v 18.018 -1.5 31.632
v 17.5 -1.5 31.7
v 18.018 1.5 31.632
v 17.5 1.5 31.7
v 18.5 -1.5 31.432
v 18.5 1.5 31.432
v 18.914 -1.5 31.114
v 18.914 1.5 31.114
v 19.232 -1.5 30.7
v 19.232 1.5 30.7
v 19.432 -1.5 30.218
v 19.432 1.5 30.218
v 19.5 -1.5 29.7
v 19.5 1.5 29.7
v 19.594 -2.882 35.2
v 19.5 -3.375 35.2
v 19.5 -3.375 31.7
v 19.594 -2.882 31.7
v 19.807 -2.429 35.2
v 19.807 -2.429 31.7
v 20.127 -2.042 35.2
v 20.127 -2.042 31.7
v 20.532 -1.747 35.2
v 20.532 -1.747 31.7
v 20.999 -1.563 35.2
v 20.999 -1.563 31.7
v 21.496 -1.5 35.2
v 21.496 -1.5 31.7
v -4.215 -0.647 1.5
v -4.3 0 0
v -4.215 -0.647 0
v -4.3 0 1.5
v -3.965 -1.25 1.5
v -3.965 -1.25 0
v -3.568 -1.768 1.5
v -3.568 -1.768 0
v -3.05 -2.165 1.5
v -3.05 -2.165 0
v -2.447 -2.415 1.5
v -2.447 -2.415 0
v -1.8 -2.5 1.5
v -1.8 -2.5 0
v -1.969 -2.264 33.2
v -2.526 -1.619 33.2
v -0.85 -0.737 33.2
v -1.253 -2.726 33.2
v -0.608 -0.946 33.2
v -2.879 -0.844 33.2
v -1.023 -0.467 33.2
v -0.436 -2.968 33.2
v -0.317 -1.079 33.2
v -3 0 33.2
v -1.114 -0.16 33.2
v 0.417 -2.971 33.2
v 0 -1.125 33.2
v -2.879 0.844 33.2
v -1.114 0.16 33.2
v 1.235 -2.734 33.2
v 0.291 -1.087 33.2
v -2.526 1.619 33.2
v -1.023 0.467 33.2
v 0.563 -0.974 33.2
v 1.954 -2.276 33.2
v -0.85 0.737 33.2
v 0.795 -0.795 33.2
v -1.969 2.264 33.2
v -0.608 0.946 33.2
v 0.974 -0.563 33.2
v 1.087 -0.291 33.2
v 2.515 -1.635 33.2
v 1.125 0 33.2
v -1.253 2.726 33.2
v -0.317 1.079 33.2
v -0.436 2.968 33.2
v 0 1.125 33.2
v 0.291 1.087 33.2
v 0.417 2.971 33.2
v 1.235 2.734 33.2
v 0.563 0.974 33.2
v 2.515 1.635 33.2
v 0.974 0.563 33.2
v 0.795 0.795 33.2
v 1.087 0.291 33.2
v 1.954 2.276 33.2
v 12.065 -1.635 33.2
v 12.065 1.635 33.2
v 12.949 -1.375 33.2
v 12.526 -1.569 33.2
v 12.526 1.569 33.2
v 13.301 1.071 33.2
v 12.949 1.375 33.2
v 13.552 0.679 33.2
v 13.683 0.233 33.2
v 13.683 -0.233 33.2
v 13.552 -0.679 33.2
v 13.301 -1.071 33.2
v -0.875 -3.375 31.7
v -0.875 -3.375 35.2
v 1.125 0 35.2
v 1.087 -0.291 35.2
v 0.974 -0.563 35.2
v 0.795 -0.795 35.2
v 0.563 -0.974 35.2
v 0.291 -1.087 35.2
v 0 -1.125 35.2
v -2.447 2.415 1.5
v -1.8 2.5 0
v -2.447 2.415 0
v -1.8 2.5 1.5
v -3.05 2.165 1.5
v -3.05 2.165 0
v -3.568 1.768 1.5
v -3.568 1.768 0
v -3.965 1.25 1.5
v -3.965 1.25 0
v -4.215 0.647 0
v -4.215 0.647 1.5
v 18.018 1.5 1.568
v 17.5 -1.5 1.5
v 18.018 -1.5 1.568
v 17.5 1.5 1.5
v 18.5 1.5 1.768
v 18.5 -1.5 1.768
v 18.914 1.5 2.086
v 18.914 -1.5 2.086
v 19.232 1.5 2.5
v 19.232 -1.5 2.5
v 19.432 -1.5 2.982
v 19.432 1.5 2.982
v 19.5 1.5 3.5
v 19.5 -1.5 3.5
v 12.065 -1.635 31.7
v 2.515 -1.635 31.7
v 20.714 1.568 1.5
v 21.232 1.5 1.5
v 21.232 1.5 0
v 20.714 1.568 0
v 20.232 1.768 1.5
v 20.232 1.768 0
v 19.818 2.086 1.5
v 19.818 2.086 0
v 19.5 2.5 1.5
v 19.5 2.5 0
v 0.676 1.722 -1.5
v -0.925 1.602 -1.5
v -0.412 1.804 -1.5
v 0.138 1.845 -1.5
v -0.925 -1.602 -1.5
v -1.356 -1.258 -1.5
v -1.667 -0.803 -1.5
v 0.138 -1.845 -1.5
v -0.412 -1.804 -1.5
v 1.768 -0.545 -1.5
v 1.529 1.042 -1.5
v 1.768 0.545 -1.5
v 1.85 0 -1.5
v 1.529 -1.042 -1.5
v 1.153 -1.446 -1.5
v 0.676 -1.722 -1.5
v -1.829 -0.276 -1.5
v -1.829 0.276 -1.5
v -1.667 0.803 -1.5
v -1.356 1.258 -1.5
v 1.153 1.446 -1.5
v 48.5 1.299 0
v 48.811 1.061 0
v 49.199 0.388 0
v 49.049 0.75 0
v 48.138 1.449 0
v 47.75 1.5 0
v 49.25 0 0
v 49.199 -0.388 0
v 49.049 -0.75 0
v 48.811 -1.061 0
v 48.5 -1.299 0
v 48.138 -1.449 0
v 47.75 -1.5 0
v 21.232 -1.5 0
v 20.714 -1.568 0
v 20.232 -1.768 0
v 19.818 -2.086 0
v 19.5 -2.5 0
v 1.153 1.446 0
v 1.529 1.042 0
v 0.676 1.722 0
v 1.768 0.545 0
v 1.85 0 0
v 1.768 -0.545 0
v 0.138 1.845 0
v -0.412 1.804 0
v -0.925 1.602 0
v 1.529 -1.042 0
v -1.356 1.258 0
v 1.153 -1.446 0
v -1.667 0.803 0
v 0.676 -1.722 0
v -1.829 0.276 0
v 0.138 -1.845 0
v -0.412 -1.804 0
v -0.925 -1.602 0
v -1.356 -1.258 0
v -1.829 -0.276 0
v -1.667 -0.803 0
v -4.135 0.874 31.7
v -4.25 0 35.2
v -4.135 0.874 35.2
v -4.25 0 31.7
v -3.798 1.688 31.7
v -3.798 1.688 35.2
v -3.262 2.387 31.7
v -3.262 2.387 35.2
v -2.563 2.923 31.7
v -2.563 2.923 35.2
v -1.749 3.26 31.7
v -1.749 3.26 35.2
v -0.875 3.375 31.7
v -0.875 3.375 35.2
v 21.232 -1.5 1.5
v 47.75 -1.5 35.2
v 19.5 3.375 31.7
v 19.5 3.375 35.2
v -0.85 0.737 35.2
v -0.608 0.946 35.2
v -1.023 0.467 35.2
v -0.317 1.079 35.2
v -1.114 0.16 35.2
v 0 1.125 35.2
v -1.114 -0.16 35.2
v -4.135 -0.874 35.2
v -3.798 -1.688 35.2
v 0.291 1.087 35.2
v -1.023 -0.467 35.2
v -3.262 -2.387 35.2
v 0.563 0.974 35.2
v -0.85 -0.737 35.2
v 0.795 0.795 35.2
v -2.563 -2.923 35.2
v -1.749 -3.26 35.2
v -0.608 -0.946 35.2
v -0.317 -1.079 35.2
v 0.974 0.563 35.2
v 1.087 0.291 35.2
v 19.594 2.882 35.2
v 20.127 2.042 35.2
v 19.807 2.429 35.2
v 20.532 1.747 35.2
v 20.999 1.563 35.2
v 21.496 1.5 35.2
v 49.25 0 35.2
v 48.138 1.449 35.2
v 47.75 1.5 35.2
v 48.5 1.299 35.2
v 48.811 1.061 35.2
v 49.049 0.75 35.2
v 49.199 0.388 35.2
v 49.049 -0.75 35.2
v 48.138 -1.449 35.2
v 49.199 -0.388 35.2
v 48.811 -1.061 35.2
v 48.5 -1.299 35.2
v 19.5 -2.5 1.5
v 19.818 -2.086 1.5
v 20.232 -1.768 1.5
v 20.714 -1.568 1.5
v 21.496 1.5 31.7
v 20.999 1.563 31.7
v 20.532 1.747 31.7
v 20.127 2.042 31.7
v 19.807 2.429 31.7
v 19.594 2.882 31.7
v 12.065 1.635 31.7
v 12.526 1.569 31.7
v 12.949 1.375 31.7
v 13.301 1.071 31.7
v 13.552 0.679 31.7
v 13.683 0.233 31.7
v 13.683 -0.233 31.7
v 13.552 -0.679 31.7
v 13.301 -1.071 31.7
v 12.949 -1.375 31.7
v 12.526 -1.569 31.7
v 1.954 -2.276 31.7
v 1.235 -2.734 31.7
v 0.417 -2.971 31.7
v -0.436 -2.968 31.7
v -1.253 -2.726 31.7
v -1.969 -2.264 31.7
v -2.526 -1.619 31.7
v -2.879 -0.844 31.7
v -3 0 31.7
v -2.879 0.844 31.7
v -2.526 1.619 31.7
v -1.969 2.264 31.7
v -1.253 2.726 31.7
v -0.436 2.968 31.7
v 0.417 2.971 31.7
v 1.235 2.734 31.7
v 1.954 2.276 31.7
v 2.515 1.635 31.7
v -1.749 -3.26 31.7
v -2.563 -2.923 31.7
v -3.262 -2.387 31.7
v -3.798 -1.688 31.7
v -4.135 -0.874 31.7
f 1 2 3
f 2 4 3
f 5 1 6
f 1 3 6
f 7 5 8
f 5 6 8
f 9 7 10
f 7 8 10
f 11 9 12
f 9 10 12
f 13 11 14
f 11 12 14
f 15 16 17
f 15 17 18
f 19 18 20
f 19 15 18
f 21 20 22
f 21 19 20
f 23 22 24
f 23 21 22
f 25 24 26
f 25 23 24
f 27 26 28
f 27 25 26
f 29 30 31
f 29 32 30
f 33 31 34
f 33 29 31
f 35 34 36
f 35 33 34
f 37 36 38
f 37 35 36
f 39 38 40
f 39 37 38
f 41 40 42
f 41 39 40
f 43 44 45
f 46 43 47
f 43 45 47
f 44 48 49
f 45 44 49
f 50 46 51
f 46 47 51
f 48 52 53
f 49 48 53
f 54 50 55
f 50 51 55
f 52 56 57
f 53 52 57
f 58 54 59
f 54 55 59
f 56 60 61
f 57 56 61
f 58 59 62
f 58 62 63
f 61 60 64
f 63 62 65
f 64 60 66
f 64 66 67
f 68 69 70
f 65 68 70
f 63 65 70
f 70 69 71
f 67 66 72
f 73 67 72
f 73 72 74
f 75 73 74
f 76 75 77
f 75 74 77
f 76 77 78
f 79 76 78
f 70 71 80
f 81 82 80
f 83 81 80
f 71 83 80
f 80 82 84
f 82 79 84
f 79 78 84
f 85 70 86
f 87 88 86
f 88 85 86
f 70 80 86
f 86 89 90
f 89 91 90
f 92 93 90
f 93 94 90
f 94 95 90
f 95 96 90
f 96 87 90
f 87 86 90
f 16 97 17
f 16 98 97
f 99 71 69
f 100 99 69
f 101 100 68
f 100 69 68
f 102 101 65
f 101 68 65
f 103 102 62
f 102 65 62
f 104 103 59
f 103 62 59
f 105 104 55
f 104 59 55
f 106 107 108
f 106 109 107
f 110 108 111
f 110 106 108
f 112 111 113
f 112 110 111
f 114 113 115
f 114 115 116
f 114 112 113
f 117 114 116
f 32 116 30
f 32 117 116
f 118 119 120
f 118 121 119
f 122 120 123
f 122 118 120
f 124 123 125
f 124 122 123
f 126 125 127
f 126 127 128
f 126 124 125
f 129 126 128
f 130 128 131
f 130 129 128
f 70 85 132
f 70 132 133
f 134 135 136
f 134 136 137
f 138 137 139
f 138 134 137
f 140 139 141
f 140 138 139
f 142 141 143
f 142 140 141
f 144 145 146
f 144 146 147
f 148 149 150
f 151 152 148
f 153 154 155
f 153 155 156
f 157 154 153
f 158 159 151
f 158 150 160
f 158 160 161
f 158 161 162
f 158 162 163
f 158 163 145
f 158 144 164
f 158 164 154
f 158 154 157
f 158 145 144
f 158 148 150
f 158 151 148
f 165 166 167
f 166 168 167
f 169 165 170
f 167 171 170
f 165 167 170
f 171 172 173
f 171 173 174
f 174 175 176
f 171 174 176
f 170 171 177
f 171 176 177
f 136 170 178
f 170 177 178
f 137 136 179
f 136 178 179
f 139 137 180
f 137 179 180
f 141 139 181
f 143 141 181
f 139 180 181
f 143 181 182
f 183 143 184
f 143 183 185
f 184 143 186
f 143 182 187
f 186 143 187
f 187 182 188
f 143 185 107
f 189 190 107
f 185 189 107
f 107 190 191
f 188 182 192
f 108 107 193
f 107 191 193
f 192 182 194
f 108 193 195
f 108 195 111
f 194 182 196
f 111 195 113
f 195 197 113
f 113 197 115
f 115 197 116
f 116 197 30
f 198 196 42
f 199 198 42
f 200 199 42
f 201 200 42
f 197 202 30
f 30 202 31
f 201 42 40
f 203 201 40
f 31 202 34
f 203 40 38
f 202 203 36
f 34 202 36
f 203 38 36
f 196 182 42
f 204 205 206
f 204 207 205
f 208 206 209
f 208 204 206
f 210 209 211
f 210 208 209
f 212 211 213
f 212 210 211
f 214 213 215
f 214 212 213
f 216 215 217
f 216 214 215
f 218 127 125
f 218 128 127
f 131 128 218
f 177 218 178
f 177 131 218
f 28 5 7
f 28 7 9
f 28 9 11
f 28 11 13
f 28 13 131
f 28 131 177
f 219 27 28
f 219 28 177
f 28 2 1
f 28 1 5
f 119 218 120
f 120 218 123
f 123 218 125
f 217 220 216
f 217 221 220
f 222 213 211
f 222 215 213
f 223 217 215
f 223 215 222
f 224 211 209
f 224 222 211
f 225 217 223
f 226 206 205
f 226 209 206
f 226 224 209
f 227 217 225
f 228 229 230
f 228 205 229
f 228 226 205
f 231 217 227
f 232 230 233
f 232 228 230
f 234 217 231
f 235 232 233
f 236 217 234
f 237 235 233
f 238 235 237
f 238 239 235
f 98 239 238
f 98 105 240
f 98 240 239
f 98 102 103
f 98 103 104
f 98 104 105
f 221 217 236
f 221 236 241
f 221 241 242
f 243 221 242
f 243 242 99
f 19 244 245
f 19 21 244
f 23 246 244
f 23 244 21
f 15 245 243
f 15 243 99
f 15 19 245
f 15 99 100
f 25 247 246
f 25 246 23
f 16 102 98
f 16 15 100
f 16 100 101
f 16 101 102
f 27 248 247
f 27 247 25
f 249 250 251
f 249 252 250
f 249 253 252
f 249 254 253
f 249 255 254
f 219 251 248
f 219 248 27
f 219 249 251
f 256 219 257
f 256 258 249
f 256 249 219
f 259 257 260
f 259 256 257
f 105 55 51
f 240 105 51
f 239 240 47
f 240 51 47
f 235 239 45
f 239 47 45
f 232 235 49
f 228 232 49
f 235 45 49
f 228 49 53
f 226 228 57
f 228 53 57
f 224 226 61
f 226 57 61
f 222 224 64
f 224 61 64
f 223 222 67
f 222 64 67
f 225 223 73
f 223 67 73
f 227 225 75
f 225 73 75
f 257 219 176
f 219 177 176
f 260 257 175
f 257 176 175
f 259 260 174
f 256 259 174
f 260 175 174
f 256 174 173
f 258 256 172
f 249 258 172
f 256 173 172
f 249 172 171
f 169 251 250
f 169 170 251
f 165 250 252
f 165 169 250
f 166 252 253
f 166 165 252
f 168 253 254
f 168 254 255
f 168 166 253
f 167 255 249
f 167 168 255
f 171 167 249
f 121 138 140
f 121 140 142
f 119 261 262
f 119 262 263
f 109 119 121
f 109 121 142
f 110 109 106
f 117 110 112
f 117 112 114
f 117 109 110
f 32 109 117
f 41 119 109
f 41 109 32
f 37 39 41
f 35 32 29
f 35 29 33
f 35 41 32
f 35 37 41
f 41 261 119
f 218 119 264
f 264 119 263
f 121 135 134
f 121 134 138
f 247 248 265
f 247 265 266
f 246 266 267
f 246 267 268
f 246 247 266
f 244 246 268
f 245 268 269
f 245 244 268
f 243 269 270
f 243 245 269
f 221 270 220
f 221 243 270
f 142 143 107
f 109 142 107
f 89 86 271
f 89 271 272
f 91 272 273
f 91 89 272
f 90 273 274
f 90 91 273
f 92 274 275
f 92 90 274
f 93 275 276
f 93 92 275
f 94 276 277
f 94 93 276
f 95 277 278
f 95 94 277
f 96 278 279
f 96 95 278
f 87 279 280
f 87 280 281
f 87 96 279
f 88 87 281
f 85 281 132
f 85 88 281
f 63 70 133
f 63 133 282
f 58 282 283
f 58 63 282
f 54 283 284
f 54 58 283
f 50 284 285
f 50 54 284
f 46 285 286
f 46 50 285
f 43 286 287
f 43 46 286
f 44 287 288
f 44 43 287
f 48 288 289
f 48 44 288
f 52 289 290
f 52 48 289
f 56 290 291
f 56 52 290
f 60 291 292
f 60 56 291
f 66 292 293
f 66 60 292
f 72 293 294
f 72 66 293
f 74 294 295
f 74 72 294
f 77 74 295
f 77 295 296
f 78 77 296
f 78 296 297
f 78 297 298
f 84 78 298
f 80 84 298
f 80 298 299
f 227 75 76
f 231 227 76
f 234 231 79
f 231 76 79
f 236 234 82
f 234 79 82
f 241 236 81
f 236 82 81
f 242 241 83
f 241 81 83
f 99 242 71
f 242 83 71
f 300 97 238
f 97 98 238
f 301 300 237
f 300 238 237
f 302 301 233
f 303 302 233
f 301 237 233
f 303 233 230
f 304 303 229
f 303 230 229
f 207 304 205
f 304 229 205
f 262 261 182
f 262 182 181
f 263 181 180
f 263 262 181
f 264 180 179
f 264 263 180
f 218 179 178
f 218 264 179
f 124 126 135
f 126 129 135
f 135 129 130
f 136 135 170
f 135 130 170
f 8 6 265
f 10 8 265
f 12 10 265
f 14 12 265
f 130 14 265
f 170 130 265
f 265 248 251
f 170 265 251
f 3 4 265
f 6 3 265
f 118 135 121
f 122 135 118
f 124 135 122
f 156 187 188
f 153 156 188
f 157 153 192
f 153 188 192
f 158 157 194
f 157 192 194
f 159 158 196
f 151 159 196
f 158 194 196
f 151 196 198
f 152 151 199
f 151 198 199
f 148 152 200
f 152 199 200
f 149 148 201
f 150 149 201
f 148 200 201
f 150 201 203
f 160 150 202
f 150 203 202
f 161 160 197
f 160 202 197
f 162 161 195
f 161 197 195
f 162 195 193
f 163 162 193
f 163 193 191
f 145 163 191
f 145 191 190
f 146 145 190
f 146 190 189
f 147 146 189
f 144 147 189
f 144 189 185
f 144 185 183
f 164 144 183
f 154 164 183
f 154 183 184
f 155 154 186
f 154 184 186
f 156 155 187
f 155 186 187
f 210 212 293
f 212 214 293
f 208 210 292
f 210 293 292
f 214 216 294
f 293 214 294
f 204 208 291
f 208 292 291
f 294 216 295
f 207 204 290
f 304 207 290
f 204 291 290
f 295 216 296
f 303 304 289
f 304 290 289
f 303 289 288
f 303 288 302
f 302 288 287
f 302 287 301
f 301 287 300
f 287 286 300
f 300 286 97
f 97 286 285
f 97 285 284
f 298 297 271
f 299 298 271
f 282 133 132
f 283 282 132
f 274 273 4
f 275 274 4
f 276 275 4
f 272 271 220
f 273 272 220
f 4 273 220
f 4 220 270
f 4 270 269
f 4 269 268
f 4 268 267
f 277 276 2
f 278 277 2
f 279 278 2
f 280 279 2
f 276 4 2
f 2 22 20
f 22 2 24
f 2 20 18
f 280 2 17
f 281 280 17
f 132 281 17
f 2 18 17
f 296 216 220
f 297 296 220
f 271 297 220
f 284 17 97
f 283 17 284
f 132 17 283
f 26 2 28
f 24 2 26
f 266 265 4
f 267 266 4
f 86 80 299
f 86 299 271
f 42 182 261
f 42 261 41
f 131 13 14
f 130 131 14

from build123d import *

# Parameters (mm, degrees)
BOSS_EXTRUDE10_DEPTH = 2
BOSS_EXTRUDE15_DEPTH = 1.5
BOSS_EXTRUDE17_START = 2
SKETCH1_17_W         = 29.75
SKETCH1_17_H         = 3
BOSS_EXTRUDE17_DEPTH = 35.2
SKETCH2_W            = 23.8
SKETCH2_H            = 5
BOSS_EXTRUDE18_DEPTH = 1.5
FILLET1_R            = 2
FILLET3_R            = 2
FILLET2_R            = 3.375
FILLET5_R            = 2.5
SKETCH4_R            = 1.85
BOSS_EXTRUDE19_DEPTH = 1.5
FILLET4_R            = 1.5


# Some blends are built 0.0001 mm under size
with BuildPart() as part:
    # Sketch1 → Boss-Extrude10 (new body)
    # profile 1 of 6: a face of its own
    with BuildSketch(Plane.XY.offset(33.2)):
        Polygon((-4.25, 3.375), (-4.25, -3.375), (19.5, -3.375), (19.5, -1.5), (19.5, 1.5), (19.5, 3.375), align=None)
        with BuildLine():
            ThreePointArc((2.515308132, -1.635), (-2.636759375, -1.430908802), (0, 3))
            ThreePointArc((0, 3), (1.430908802, 2.636759375), (2.515308132, 1.635))
            Line((2.515308132, 1.635), (12.065, 1.635))
            ThreePointArc((12.065, 1.635), (13.7, 0), (12.065, -1.635))
            Line((12.065, -1.635), (2.515308132, -1.635))
        make_face(mode=Mode.SUBTRACT)
    # profile 2 of 6: a face of its own
    with BuildSketch(Plane.XY.offset(33.2)):
        with BuildLine():
            Line((12.065, 1.635), (2.515308132, 1.635))
            ThreePointArc((2.515308132, 1.635), (2.876275751, 0.852665117), (3, 0))
            ThreePointArc((3, 0), (2.876275751, -0.852665117), (2.515308132, -1.635))
            Line((2.515308132, -1.635), (12.065, -1.635))
            Line((12.065, -1.635), (12.065, 1.635))
        make_face()
    # profile 3 of 6: a face of its own
    with BuildSketch(Plane.XY.offset(33.2)):
        with BuildLine():
            ThreePointArc((12.065, 1.635), (13.7, 0), (12.065, -1.635))
            Line((12.065, -1.635), (12.065, 1.635))
        make_face()
    # profile 4 of 6: a face of its own
    with BuildSketch(Plane.XY.offset(33.2)):
        with BuildLine():
            Line((0, 1.125), (0, 1.635))
            Line((0, 1.635), (0, 3))
            ThreePointArc((0, 3), (-2.636759375, -1.430908802), (2.515308132, -1.635))
            Line((2.515308132, -1.635), (0, -1.635))
            Line((0, -1.635), (0, -1.125))
            ThreePointArc((0, -1.125), (-1.125, 0), (0, 1.125))
        make_face()
    # profile 5 of 6: a face of its own
    with BuildSketch(Plane.XY.offset(33.2)):
        with BuildLine():
            Line((2.515308132, 1.635), (0, 1.635))
            Line((0, 1.635), (0, 1.125))
            ThreePointArc((0, 1.125), (0.795495129, 0.795495129), (1.125, 0))
            ThreePointArc((1.125, 0), (0.795495129, -0.795495129), (0, -1.125))
            Line((0, -1.125), (0, -1.635))
            Line((0, -1.635), (2.515308132, -1.635))
            ThreePointArc((2.515308132, -1.635), (2.876275751, -0.852665117), (3, 0))
            ThreePointArc((3, 0), (2.876275751, 0.852665117), (2.515308132, 1.635))
        make_face()
    # profile 6 of 6: a face of its own
    with BuildSketch(Plane.XY.offset(33.2)):
        with BuildLine():
            Line((0, 3), (0, 1.635))
            Line((0, 1.635), (2.515308132, 1.635))
            ThreePointArc((2.515308132, 1.635), (1.430908802, 2.636759375), (0, 3))
        make_face()
    extrude(amount=BOSS_EXTRUDE10_DEPTH)

    # Sketch1<16> → Boss-Extrude15 (add)
    with BuildSketch(Plane.XY.offset(33.2)):
        Polygon((-4.25, 3.375), (-4.25, -3.375), (19.5, -3.375), (19.5, -1.5), (19.5, 1.5), (19.5, 3.375), align=None)
        with BuildLine():
            ThreePointArc((12.065, 1.635), (13.7, 0), (12.065, -1.635))
            Line((12.065, -1.635), (2.515308132, -1.635))
            ThreePointArc((2.515308132, -1.635), (-3, 0), (2.515308132, 1.635))
            Line((2.515308132, 1.635), (12.065, 1.635))
        make_face(mode=Mode.SUBTRACT)
    extrude(amount=-BOSS_EXTRUDE15_DEPTH)

    # Sketch1<17> → Boss-Extrude17 (add)
    with BuildSketch(Plane.XY.offset(33.2).offset(BOSS_EXTRUDE17_START)):
        with Locations((34.375, 0)):
            Rectangle(SKETCH1_17_W, SKETCH1_17_H)
    extrude(amount=-BOSS_EXTRUDE17_DEPTH)

    # Sketch2 → Boss-Extrude18 (add)
    with BuildSketch(Plane(origin=(0, 0, 0), x_dir=(-1, 0, 0), z_dir=(0, 0, -1))):
        with Locations((-7.6, 0)):
            Rectangle(SKETCH2_W, SKETCH2_H)
    extrude(amount=-BOSS_EXTRUDE18_DEPTH)

    # Fillet1
    # the kernel refuses this fillet: 2 mm, written as the material it adds along each edge
    with BuildSketch(Plane(origin=(19.5, 1.5, 1.5), x_dir=(1, 0, 0), z_dir=(0, 0, -1))) as fillet1_piece_1:
        with BuildLine():
            CenterArc((1.732050808, -2), FILLET1_R, 90, 60)
            Line((0, -1), (0, 0))
            Line((0, 0), (1.732050808, 0))
        make_face()
    extrude(amount=1.5)
    with BuildSketch(Plane(origin=(19.5, -1.5, 1.5), x_dir=(1, 0, 0), z_dir=(0, 0, -1))) as fillet1_piece_2:
        with BuildLine():
            CenterArc((1.732050808, 2), FILLET1_R, 210, 60)
            Line((0, 1), (0, 0))
            Line((0, 0), (1.732050808, 0))
        make_face()
    extrude(amount=1.5)
    with BuildSketch(Plane(origin=(19.5, -1.5, 35.2), x_dir=(0, -1, 0), z_dir=(0, 0, -1))) as fillet1_piece_3:
        with BuildLine():
            CenterArc((2, -1.996089928), FILLET1_R, 93.583321698, 86.416678302)
            Line((0, -1.996089928), (0, 0))
            Line((0, 0), (1.875, 0))
        make_face()
    extrude(amount=3.5)
    with BuildSketch(Plane(origin=(19.5, 1.5, 35.2), x_dir=(0, 1, 0), z_dir=(0, 0, -1))) as fillet1_piece_4:
        with BuildLine():
            CenterArc((2, 1.996089928), FILLET1_R, 180, 86.416678302)
            Line((0, 1.996089928), (0, 0))
            Line((0, 0), (1.875, 0))
        make_face()
    extrude(amount=3.5)

    # Fillet3
    fillet3_edges = [part.edges().sort_by_distance(p)[0] for p in [
        (19.5, 0, 31.7),
        (19.5, 0, 1.5),
    ]]
    fillet(fillet3_edges, radius=FILLET3_R)

    # Fillet2
    fillet2_edges = [part.edges().sort_by_distance(p)[0] for p in [
        (-4.25, 3.375, 33.45),
        (-4.25, -3.375, 33.45),
    ]]
    fillet(fillet2_edges, radius=FILLET2_R - 0.0001)  # a hair under: the kernel refuses the full size

    # Fillet5
    fillet5_edges = [part.edges().sort_by_distance(p)[0] for p in [
        (-4.3, -2.5, 0.75),
        (-4.3, 2.5, 0.75),
    ]]
    fillet(fillet5_edges, radius=FILLET5_R - 0.0001)  # a hair under: the kernel refuses the full size

    # Sketch4 → Boss-Extrude19 (add)
    with BuildSketch(Plane(origin=(0, 0, 0), x_dir=(-1, 0, 0), z_dir=(0, 0, -1))):
        with Locations(Location((0, 0, 0), (0, 0, 180))):
            Circle(SKETCH4_R)
    extrude(amount=BOSS_EXTRUDE19_DEPTH)

    # Fillet4
    fillet4_edges = [part.edges().sort_by_distance(p)[0] for p in [
        (49.25, 1.5, 17.6),
        (49.25, -1.5, 17.6),
    ]]
    fillet(fillet4_edges, radius=FILLET4_R - 0.0001)  # a hair under: the kernel refuses the full size


solid = part.part
